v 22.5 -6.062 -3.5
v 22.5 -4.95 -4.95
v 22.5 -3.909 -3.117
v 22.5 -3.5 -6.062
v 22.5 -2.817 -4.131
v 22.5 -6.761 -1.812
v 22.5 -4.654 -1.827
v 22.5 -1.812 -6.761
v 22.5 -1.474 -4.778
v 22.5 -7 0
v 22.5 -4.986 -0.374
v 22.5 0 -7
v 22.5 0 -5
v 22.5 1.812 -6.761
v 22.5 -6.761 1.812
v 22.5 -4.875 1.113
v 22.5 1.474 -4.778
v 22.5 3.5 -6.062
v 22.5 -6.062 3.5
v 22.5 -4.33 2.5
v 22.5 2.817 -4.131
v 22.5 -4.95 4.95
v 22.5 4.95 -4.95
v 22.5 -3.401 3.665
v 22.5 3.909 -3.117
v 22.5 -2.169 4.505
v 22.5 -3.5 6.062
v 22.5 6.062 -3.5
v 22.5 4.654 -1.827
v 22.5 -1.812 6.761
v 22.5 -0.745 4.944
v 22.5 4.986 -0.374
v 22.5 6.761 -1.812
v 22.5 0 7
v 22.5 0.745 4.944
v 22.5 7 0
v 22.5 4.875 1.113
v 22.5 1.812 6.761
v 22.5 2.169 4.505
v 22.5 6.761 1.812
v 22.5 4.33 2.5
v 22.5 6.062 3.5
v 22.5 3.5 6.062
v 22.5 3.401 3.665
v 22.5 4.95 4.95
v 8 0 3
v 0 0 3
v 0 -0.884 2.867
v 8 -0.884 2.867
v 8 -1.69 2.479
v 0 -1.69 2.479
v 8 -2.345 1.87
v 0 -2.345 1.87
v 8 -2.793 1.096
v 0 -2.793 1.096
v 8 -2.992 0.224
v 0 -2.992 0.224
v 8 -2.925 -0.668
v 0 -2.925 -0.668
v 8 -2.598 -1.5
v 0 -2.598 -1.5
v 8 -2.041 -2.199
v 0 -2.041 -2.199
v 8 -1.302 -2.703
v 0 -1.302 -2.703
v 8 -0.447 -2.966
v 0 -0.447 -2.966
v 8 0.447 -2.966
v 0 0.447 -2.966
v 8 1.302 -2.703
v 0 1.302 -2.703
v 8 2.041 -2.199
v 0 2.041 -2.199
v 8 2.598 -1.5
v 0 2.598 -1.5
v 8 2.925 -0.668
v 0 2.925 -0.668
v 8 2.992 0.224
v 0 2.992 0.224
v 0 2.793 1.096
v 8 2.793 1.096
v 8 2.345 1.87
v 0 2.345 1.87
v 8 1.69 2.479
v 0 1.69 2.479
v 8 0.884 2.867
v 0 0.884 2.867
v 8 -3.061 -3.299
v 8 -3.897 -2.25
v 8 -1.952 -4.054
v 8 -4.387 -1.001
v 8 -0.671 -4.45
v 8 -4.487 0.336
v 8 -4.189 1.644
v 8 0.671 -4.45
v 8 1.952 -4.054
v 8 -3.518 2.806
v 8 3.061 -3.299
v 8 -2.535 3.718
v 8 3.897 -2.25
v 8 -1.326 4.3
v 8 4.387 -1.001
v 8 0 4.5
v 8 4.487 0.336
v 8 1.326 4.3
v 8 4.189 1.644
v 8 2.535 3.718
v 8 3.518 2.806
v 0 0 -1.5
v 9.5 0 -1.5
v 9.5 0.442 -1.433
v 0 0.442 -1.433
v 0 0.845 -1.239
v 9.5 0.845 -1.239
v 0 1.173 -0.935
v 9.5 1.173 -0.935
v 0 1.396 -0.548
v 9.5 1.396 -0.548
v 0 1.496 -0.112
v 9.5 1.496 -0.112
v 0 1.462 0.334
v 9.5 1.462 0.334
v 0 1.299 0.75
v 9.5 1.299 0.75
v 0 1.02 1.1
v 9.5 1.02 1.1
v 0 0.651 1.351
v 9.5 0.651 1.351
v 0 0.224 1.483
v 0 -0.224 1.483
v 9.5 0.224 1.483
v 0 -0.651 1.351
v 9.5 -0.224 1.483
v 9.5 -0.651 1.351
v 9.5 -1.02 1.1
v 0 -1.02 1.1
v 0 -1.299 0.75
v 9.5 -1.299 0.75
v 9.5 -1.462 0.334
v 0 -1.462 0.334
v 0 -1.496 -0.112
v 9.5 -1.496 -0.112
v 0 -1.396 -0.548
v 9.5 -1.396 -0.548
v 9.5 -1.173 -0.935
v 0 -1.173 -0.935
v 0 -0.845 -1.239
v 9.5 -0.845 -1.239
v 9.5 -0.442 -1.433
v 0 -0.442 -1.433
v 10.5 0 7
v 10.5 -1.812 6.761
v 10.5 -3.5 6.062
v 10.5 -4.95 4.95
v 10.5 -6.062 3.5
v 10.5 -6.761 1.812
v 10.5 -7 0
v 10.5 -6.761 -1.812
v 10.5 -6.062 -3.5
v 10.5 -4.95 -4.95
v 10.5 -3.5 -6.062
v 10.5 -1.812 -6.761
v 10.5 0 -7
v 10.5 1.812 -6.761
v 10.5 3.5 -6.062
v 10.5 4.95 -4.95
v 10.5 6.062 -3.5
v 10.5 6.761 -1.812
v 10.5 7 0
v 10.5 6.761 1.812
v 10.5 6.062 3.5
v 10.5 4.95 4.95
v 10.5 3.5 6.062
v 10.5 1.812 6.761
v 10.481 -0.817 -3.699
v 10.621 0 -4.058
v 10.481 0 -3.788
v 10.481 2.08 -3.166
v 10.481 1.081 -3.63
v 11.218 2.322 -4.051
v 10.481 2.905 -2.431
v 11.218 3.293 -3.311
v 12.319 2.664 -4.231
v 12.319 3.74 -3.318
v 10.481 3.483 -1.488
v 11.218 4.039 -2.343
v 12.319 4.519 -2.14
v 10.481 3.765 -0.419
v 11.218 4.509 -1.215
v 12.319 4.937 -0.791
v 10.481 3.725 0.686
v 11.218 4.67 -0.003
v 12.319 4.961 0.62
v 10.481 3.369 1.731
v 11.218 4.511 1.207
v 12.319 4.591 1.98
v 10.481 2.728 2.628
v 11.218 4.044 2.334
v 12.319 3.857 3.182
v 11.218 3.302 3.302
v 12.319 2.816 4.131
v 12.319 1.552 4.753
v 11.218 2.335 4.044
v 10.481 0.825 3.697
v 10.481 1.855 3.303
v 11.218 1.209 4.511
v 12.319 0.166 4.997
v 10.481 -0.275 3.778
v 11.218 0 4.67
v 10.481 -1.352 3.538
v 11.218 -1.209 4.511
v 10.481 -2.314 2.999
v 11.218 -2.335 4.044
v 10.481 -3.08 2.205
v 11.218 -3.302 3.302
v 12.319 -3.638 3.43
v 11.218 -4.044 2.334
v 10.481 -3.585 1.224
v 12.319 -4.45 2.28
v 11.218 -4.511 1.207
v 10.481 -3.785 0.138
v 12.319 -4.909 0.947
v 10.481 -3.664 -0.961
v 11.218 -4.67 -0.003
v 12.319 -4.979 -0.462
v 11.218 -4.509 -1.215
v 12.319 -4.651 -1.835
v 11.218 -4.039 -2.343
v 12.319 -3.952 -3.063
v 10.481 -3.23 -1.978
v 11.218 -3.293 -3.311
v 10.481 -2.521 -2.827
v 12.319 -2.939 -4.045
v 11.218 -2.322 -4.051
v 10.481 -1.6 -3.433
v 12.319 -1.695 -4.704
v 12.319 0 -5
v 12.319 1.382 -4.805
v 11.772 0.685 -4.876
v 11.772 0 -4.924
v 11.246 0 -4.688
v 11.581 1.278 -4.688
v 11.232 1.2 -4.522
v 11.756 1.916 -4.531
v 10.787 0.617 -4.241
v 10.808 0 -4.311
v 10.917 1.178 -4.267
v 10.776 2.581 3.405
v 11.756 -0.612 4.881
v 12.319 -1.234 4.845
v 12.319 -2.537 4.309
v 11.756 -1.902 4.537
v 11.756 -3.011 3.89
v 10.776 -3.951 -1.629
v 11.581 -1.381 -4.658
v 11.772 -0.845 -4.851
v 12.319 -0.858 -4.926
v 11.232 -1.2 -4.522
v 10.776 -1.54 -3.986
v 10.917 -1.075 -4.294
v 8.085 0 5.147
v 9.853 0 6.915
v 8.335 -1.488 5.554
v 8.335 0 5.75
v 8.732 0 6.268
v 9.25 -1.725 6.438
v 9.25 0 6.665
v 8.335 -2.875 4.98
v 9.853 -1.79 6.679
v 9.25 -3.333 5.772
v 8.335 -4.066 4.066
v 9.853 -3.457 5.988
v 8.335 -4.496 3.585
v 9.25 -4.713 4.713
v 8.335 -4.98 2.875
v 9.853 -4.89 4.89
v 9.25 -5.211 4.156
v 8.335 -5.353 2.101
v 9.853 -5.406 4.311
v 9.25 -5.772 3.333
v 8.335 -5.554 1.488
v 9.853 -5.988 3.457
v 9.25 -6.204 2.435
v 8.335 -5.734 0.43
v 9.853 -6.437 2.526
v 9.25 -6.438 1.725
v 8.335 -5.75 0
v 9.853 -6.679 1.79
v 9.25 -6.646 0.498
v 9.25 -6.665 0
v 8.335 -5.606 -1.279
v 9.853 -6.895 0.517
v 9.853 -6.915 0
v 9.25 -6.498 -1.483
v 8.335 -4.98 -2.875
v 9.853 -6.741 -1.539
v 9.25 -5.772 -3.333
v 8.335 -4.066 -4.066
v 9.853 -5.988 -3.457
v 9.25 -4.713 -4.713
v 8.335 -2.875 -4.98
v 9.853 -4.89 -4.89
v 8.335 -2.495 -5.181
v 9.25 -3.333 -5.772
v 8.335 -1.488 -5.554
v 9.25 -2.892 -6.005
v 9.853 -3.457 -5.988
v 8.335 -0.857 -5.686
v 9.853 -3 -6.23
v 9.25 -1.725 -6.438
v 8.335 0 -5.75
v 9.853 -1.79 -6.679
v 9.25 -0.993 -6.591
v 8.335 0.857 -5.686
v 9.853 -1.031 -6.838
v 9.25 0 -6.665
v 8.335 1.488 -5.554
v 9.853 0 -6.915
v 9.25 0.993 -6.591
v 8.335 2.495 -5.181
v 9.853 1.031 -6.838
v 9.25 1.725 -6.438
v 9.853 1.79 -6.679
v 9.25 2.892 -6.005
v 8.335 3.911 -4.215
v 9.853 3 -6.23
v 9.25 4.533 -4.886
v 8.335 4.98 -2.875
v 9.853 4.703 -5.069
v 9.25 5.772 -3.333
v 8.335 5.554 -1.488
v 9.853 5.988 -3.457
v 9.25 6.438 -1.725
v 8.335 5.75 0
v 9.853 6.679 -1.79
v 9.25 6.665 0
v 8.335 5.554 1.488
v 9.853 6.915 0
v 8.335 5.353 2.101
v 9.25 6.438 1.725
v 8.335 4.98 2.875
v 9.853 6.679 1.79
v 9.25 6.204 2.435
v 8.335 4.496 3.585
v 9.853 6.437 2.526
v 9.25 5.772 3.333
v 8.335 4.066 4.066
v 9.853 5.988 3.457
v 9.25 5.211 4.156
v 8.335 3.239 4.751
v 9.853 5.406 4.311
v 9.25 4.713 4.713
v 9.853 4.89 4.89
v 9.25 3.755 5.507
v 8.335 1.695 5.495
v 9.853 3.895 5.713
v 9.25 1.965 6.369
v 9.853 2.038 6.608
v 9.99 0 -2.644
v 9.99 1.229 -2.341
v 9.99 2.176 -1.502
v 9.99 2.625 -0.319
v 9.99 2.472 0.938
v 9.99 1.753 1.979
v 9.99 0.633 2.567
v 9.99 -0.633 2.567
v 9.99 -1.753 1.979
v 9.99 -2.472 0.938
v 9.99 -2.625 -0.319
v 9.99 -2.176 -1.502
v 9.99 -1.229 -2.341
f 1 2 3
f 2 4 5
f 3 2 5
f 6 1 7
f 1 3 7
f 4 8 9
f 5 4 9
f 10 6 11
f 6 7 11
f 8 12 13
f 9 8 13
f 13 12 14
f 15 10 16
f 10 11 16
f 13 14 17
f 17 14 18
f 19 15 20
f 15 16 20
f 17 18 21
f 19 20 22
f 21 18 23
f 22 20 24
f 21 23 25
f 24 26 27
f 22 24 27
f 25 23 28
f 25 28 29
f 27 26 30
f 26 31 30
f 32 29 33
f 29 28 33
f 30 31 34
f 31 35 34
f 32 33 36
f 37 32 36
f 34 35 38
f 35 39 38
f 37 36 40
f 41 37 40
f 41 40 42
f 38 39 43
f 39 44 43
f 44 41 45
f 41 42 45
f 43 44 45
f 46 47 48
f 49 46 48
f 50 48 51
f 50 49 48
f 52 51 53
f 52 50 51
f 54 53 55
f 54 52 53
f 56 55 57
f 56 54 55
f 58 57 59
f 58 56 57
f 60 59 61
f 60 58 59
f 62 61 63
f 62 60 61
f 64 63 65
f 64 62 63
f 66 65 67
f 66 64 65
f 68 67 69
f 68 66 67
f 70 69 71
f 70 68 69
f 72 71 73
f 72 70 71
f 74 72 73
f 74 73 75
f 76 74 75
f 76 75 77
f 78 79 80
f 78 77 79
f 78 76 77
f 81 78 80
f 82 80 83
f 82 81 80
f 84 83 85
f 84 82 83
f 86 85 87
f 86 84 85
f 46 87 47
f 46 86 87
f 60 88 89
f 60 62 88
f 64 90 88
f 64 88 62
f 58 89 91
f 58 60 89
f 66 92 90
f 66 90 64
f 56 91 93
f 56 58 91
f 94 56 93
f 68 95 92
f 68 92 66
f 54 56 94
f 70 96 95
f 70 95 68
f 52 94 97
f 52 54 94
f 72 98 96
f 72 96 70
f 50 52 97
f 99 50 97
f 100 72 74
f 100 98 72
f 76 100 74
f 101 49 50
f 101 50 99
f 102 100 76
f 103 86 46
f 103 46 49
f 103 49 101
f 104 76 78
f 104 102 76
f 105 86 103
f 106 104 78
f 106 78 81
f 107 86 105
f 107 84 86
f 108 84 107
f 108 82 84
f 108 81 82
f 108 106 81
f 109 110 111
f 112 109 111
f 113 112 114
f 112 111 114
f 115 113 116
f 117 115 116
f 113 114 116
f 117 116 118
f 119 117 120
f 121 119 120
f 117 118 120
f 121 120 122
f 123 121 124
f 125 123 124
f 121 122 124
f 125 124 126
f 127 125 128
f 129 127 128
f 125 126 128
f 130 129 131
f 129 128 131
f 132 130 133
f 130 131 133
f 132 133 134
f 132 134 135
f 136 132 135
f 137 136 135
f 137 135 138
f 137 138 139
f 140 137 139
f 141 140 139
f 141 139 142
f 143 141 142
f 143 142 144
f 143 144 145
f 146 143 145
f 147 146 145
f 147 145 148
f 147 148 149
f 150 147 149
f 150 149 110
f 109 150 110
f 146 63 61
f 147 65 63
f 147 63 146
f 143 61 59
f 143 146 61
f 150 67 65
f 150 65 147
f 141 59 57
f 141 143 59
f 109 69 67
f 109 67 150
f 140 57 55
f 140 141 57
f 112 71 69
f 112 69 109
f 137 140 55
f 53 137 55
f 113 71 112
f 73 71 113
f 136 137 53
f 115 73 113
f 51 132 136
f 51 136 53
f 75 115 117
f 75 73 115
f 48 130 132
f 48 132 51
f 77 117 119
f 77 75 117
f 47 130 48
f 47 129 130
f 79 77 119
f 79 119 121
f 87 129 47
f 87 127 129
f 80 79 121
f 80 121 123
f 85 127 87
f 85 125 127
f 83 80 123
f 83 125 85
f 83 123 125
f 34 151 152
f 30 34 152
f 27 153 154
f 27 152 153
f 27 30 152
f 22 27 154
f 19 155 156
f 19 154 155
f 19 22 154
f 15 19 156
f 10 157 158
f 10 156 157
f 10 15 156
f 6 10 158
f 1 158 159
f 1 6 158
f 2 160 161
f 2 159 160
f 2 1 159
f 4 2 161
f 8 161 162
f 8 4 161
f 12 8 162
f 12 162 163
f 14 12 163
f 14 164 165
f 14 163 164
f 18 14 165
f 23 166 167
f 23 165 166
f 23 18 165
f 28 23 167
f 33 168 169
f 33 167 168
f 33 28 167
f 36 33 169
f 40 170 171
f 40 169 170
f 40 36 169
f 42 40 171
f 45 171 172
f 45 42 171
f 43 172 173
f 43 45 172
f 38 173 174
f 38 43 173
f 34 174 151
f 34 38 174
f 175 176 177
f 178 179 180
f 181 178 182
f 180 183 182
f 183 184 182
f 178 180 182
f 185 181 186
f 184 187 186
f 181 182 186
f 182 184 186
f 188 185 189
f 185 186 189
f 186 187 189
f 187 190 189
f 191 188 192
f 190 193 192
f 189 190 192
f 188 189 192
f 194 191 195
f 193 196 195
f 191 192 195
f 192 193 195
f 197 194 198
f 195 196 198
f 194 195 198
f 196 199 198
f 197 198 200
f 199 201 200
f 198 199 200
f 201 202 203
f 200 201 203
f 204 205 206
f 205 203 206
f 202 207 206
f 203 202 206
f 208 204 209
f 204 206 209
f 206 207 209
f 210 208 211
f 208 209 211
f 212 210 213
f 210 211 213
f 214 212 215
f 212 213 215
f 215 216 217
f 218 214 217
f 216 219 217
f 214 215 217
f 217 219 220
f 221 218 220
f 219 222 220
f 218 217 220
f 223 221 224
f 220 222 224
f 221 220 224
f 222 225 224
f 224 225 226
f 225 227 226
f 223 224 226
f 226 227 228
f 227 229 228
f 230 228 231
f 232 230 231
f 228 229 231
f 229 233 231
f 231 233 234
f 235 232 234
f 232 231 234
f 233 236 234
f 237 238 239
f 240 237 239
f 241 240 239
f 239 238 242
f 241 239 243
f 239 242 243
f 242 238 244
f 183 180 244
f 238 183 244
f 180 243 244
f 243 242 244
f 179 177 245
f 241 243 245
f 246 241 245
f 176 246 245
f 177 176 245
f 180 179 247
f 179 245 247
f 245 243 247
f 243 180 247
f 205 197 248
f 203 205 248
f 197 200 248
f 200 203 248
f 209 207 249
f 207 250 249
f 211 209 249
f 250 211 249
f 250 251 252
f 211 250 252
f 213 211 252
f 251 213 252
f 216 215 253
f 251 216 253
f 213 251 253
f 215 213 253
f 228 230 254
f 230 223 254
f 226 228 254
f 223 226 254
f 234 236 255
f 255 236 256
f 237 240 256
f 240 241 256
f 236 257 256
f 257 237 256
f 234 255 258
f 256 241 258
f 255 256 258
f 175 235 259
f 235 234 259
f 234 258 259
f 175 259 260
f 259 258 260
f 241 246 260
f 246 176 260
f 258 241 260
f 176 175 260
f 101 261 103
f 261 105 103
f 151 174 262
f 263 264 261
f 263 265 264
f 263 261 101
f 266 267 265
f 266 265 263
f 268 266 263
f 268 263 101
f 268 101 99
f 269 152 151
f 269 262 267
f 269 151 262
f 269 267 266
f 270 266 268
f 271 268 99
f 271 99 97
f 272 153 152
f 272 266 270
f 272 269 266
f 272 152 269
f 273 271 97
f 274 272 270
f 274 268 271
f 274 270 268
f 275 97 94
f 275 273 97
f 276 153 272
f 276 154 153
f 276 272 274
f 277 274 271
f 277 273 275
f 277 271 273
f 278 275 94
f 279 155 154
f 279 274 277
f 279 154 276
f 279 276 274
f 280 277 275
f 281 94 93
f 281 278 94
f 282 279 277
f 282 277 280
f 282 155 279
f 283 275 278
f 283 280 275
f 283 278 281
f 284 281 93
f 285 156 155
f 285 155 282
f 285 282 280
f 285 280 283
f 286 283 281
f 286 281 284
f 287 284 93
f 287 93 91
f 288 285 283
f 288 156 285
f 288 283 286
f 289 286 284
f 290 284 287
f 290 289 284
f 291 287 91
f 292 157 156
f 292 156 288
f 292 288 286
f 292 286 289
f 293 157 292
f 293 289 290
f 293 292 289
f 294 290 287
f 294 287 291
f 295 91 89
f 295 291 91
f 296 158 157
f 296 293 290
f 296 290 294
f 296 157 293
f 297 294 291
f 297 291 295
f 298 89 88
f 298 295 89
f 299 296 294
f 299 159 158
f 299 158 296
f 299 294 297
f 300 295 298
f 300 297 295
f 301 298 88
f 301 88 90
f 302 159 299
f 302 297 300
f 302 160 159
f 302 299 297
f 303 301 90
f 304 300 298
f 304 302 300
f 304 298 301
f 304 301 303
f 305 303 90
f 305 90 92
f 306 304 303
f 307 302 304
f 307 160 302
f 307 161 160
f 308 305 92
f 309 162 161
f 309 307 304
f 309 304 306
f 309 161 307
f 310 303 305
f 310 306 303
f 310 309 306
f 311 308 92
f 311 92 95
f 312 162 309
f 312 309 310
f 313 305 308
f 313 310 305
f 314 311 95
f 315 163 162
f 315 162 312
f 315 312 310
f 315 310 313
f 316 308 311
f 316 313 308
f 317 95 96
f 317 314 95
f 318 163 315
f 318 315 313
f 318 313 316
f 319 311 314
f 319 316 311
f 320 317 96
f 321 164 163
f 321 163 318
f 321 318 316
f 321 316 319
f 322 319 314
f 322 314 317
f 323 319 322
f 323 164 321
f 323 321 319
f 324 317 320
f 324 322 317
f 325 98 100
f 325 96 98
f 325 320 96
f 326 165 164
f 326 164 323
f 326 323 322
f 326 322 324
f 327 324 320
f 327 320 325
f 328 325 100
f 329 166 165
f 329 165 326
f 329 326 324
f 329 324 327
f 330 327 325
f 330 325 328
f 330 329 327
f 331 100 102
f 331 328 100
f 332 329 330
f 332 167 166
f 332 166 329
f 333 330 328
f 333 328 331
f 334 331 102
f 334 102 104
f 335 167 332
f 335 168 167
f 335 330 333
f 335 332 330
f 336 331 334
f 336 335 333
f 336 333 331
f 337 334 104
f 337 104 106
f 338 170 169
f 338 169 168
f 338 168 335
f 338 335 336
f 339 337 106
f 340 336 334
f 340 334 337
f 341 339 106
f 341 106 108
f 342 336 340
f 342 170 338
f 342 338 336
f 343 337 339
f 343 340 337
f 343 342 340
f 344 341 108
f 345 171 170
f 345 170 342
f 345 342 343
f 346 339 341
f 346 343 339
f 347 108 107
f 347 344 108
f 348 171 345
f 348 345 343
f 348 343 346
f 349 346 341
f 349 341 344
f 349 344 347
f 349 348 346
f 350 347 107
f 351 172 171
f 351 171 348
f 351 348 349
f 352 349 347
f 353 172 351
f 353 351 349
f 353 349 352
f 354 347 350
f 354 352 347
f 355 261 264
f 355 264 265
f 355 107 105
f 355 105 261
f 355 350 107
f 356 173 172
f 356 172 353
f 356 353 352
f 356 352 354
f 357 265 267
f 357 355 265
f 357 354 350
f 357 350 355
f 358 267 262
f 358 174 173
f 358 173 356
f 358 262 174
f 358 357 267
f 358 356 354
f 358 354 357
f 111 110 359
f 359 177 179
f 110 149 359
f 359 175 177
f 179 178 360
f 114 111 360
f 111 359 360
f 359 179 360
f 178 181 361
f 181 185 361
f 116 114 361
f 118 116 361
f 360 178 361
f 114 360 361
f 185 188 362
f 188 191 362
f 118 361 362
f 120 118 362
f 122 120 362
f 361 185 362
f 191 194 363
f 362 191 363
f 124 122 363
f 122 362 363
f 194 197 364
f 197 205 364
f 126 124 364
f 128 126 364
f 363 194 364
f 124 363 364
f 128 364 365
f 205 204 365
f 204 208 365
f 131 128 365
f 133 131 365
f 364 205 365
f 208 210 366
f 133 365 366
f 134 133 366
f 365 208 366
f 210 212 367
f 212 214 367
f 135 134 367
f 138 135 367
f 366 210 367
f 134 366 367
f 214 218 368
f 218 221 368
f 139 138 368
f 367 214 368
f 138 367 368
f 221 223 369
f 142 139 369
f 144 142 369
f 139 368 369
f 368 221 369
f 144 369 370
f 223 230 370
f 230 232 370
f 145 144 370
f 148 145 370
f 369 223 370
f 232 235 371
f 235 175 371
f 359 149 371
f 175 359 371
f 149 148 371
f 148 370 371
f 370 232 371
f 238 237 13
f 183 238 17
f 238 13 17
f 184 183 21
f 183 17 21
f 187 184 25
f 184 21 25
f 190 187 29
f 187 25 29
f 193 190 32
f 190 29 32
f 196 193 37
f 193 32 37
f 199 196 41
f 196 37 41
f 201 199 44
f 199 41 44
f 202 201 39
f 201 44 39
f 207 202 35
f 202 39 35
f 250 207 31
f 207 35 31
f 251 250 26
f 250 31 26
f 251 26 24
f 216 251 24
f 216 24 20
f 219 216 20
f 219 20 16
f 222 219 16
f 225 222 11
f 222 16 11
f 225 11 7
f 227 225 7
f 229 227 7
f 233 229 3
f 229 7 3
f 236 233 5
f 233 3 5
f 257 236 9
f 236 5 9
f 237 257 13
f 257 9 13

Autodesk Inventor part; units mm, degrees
ref_plane "YZ Plane" through (0, 0, 0) normal (1, 0, 0) x (0, 1, 0)
ref_plane "XZ Plane" through (0, 0, 0) normal (0, 1, 0) x (-1, 0, 0)
ref_plane "XY Plane" through (0, 0, 0) normal (0, 0, 1) x (1, 0, 0)
sketch "Skizze1" plane through (0, 0, 0) normal (0, 1, 0) x (-1, 0, 0)
  line L0 (0, 0) -> (0, 3)
  line L1 (0, 3) -> (-8, 3)
  line L2 (-8, 3) -> (-8, 4.5)
  line L3 (-10.5, 7) -> (-22.5, 7)
  line L4 (-22.5, 7) -> (-22.5, 0)
  line L5 (-22.5, 0) -> (0, 0)
  arc A0 (-8, 4.5) -> (-10.5, 7) centre (-10.5, 4.5) ccw
  point P0 (-8, 7)
  dimension "d0" = 6
  dimension "d1" = 8
  dimension "d2" = 14.5
  dimension "d3" = 14
  dimension "d4" = 2.5
revolve "Umdrehung1" add sketch "Skizze1" angle 360 about axis through (22.5, 0, 0) along (-1, 0, 0)
thread "Gewinde1" size "M6x1" class "6g" standard "ISO Metric profile" length 8
sketch "Skizze2" plane through (0, 0, 0) normal (0, 1, 0) x (-1, 0, 0)
  line L0 (0, 0) -> (-22.5, 0)
  line L1 (-22.5, -7) -> (-22.5, 7) projected
  line L2 (0, -1.5) -> (-9.5, -1.5)
  line L3 (0, -1.5) -> (0, 0)
  line L4 (0, -3) -> (0, 3) projected
  line L5 (-11, -5) -> (-22.5, -5)
  line L6 (-9.5, -1.5) -> (-11, -5)
  line L7 (-22.5, -5) -> (-22.5, 0)
  dimension "d8" = 3
  dimension "d9" = 9.5
  dimension "d12" = 10
  dimension "d13" = 11.5
revolve "Umdrehung2" cut sketch "Skizze2" angle 360 about axis through (0, 0, 0) along (1, 0, 0)
fillet "Rundung1" radius 2 1 edges at (11, 0, 5)
thread "Gewinde2" size "M10x1.5" class "6H" standard "ISO Metric profile" length 10.181
properties part number "1071"
